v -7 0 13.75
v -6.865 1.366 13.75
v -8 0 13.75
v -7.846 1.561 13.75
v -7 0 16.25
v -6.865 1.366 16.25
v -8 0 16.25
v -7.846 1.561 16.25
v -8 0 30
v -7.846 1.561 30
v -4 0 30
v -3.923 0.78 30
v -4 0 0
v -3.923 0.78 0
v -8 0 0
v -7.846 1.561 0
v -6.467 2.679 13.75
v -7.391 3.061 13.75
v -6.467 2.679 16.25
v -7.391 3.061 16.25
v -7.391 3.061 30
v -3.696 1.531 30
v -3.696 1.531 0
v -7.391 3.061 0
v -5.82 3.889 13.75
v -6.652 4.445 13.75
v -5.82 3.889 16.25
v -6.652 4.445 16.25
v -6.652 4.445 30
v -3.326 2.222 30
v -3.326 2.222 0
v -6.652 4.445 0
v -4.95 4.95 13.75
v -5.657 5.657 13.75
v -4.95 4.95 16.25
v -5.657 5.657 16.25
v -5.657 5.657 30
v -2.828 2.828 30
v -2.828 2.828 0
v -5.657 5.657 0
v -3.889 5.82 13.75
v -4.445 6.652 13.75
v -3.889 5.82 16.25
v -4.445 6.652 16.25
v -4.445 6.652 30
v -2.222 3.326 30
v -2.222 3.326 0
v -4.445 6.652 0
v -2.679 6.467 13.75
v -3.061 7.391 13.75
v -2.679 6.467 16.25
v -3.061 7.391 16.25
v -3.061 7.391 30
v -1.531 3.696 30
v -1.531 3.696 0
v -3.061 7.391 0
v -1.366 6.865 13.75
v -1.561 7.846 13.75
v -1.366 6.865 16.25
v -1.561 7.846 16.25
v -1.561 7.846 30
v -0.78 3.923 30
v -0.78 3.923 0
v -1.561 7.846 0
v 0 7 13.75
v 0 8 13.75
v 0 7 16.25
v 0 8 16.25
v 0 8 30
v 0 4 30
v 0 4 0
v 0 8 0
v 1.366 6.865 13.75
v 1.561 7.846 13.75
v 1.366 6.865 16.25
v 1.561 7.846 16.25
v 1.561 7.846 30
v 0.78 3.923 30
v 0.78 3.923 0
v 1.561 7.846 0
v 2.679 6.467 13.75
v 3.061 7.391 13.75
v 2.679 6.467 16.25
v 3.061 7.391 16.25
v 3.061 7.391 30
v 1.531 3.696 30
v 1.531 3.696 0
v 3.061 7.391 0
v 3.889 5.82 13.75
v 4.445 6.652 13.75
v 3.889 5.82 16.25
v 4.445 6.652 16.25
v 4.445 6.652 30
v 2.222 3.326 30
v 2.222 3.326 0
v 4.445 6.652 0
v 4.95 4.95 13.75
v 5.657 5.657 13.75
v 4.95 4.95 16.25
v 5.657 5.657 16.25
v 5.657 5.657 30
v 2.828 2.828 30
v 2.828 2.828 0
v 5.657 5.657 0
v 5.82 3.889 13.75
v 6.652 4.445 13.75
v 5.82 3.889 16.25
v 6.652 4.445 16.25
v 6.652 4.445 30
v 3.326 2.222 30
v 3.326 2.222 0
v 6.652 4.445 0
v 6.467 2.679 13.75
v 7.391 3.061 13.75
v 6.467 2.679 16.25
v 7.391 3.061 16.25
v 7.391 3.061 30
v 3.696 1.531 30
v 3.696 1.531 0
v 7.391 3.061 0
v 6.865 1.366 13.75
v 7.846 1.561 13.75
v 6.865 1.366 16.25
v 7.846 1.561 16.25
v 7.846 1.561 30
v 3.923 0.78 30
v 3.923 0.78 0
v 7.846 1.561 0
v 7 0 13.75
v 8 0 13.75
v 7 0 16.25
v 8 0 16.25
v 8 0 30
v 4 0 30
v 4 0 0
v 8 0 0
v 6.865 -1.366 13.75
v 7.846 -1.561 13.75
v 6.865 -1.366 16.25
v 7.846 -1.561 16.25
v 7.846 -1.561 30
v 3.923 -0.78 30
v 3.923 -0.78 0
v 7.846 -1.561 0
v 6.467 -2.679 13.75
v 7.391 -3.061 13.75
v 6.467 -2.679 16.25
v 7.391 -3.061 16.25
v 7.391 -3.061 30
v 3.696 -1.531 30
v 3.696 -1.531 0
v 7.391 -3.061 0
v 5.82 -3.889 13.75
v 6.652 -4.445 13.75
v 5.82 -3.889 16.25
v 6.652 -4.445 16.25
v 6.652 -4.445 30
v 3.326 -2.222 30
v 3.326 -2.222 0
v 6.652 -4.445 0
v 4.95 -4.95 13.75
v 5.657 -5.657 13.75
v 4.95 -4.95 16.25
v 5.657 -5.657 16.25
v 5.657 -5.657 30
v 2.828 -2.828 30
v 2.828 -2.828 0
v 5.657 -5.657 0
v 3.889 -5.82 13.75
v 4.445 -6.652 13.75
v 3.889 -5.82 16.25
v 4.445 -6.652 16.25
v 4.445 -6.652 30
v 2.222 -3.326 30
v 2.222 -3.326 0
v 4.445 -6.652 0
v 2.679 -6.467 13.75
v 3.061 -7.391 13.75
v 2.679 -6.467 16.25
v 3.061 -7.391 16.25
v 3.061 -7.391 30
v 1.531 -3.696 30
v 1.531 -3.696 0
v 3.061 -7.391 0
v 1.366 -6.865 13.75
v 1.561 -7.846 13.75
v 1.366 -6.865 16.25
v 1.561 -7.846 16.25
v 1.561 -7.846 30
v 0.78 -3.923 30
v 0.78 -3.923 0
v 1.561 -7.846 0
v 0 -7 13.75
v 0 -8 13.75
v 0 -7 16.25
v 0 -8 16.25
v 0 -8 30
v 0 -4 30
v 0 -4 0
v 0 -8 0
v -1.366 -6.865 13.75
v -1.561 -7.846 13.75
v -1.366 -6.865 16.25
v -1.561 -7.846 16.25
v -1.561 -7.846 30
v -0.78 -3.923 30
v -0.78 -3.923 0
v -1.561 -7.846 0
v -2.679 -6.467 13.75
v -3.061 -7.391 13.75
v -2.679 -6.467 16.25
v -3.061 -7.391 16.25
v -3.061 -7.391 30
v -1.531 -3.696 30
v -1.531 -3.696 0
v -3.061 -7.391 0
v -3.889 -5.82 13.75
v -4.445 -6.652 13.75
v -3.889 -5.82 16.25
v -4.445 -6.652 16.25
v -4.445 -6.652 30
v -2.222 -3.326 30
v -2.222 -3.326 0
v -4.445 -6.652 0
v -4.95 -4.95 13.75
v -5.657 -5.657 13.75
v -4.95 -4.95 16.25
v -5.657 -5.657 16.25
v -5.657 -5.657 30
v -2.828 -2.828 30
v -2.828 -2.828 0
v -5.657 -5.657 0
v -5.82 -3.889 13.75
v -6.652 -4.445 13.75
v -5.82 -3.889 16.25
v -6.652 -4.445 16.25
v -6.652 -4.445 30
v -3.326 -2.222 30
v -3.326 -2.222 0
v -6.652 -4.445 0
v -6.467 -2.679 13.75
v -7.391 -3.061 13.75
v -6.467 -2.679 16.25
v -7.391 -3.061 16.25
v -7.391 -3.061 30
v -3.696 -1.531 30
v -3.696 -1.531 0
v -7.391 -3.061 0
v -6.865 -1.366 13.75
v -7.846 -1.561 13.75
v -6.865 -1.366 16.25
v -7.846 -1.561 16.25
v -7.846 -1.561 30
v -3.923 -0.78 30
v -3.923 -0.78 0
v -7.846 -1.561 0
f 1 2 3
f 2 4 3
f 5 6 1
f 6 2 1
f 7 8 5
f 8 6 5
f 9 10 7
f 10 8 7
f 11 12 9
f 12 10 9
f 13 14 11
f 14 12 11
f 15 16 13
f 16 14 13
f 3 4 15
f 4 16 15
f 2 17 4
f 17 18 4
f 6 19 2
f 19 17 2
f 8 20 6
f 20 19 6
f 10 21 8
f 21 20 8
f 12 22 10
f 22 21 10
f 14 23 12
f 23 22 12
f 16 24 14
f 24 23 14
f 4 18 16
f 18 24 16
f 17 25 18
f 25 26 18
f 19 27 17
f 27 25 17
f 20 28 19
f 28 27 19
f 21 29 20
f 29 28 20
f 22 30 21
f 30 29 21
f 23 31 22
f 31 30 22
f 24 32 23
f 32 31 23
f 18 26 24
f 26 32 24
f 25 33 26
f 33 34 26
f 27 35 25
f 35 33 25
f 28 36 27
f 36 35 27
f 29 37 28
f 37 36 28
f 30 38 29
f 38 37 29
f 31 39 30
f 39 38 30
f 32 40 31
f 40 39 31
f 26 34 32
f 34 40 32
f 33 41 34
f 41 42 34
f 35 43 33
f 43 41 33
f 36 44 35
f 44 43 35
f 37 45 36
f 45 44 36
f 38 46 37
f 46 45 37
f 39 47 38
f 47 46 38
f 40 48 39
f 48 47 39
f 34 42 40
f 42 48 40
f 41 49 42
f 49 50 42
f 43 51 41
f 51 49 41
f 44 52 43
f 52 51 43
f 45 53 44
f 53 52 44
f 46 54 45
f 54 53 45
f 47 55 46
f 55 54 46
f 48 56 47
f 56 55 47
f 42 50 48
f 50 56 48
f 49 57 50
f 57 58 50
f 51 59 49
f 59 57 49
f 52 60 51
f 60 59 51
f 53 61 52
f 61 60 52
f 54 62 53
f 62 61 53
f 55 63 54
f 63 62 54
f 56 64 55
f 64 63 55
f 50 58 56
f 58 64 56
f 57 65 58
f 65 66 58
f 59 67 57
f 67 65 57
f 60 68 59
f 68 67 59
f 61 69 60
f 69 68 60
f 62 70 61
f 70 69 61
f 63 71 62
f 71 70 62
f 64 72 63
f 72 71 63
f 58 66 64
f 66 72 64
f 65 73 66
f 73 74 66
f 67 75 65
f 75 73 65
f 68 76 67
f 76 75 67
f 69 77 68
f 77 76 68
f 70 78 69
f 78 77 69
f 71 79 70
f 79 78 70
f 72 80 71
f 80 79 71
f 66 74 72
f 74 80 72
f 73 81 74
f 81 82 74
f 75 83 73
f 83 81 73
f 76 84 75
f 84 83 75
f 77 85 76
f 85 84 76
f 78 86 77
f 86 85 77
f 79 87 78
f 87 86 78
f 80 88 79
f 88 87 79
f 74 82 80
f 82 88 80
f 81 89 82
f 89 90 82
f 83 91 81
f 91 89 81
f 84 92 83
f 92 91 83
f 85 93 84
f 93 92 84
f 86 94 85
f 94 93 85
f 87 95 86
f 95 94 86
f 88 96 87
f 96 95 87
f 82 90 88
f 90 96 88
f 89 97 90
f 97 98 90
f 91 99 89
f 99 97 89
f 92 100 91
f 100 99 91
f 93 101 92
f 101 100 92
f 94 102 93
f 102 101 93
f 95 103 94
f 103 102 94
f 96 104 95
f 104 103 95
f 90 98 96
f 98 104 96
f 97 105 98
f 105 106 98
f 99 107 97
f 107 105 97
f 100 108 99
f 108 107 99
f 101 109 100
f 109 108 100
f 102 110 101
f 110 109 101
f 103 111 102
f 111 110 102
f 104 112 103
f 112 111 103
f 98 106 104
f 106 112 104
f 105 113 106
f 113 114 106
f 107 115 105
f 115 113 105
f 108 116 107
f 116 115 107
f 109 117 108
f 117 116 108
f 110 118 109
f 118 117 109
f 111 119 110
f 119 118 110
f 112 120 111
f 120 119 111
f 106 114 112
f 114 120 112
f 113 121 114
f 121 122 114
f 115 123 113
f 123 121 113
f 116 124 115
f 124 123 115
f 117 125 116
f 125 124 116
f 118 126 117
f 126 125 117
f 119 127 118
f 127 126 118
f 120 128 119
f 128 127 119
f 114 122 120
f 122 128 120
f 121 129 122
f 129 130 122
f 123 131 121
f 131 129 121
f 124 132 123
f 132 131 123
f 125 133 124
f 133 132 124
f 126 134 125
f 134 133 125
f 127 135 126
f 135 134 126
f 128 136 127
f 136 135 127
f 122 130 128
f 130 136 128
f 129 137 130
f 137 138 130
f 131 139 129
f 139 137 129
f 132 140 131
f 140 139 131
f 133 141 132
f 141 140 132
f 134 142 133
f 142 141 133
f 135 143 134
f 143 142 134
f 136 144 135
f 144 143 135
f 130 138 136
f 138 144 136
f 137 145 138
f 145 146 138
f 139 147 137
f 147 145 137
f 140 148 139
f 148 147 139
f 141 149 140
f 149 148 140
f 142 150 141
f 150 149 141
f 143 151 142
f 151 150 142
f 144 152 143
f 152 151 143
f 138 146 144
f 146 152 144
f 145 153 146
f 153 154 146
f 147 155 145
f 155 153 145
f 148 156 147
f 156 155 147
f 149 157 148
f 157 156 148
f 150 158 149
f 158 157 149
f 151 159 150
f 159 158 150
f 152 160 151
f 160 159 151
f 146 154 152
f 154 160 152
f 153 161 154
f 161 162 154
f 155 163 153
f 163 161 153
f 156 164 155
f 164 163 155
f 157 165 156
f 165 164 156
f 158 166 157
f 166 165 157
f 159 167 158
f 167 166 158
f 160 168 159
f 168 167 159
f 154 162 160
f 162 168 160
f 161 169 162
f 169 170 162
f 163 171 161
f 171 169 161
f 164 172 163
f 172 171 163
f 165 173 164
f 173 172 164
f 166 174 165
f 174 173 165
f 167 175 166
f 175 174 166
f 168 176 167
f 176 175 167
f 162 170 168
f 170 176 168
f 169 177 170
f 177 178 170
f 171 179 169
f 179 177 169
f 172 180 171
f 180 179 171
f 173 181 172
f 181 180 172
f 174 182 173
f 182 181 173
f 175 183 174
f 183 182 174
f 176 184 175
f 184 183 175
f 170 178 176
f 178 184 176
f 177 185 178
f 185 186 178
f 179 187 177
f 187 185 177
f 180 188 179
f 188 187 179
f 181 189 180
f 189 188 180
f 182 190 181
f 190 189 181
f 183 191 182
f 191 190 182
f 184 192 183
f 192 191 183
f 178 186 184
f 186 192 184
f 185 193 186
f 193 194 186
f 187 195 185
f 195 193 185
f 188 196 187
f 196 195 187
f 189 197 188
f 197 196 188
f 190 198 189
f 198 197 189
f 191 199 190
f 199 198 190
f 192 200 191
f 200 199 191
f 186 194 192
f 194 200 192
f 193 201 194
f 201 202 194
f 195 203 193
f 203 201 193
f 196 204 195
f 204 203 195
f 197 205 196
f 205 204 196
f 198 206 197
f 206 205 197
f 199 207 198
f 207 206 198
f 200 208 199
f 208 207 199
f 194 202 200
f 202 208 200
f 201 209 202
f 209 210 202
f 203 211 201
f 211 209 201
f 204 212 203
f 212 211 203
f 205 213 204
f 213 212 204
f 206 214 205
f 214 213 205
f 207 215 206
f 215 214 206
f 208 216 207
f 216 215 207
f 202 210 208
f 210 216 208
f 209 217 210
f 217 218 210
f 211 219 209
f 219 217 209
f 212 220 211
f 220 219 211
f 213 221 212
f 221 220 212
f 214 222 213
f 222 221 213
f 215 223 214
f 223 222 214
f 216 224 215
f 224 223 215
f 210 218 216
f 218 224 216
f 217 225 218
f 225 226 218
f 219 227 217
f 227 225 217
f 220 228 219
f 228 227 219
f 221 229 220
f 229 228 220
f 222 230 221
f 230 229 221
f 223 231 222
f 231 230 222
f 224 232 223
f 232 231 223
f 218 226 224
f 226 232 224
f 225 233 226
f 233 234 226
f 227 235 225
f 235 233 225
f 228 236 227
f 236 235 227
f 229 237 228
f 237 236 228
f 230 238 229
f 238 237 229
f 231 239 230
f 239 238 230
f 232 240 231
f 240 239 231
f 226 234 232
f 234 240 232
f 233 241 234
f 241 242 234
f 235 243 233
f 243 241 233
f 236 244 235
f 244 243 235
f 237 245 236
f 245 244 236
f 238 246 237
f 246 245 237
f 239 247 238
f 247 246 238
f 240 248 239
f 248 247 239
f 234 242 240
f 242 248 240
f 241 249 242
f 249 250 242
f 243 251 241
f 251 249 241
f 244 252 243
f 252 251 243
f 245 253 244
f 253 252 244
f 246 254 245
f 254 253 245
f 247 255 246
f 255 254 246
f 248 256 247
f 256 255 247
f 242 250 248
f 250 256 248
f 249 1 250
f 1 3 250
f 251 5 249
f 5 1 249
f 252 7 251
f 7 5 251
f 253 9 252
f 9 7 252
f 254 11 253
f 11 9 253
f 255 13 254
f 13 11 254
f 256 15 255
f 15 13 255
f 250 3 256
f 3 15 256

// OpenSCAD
$fn = 32;

// ----------------------------------------------------------------------
// Grooved revolve: plain_grooves, bore R4
// ----------------------------------------------------------------------

// --- parameters (mm) ---
bore_r = 4;               // bore radius
outer_r = 8;              // outer radius of the body
total_h = 30;             // overall height, Z
wall = 4;                 // radial wall thickness
groove_w = 2.5;           // groove width
groove_d = 1;             // groove depth
grooves = 1;              // number of outer grooves

bbox_x = 2 * outer_r;  // full diameter
bore_d = 2 * bore_r;  // bore diameter
body_d = 2 * outer_r;  // body diameter
revolve_angle = 360;  // full turn around the Z axis

profile = [[4, 0], [8, 0], [8, 13.75], [7, 13.75], [7, 16.25], [8, 16.25], [8, 30], [4, 30]];  // primary outline, 8 points, counter clockwise

// --- the one profile operation ---
rotate_extrude(angle = revolve_angle) polygon(points = profile);
